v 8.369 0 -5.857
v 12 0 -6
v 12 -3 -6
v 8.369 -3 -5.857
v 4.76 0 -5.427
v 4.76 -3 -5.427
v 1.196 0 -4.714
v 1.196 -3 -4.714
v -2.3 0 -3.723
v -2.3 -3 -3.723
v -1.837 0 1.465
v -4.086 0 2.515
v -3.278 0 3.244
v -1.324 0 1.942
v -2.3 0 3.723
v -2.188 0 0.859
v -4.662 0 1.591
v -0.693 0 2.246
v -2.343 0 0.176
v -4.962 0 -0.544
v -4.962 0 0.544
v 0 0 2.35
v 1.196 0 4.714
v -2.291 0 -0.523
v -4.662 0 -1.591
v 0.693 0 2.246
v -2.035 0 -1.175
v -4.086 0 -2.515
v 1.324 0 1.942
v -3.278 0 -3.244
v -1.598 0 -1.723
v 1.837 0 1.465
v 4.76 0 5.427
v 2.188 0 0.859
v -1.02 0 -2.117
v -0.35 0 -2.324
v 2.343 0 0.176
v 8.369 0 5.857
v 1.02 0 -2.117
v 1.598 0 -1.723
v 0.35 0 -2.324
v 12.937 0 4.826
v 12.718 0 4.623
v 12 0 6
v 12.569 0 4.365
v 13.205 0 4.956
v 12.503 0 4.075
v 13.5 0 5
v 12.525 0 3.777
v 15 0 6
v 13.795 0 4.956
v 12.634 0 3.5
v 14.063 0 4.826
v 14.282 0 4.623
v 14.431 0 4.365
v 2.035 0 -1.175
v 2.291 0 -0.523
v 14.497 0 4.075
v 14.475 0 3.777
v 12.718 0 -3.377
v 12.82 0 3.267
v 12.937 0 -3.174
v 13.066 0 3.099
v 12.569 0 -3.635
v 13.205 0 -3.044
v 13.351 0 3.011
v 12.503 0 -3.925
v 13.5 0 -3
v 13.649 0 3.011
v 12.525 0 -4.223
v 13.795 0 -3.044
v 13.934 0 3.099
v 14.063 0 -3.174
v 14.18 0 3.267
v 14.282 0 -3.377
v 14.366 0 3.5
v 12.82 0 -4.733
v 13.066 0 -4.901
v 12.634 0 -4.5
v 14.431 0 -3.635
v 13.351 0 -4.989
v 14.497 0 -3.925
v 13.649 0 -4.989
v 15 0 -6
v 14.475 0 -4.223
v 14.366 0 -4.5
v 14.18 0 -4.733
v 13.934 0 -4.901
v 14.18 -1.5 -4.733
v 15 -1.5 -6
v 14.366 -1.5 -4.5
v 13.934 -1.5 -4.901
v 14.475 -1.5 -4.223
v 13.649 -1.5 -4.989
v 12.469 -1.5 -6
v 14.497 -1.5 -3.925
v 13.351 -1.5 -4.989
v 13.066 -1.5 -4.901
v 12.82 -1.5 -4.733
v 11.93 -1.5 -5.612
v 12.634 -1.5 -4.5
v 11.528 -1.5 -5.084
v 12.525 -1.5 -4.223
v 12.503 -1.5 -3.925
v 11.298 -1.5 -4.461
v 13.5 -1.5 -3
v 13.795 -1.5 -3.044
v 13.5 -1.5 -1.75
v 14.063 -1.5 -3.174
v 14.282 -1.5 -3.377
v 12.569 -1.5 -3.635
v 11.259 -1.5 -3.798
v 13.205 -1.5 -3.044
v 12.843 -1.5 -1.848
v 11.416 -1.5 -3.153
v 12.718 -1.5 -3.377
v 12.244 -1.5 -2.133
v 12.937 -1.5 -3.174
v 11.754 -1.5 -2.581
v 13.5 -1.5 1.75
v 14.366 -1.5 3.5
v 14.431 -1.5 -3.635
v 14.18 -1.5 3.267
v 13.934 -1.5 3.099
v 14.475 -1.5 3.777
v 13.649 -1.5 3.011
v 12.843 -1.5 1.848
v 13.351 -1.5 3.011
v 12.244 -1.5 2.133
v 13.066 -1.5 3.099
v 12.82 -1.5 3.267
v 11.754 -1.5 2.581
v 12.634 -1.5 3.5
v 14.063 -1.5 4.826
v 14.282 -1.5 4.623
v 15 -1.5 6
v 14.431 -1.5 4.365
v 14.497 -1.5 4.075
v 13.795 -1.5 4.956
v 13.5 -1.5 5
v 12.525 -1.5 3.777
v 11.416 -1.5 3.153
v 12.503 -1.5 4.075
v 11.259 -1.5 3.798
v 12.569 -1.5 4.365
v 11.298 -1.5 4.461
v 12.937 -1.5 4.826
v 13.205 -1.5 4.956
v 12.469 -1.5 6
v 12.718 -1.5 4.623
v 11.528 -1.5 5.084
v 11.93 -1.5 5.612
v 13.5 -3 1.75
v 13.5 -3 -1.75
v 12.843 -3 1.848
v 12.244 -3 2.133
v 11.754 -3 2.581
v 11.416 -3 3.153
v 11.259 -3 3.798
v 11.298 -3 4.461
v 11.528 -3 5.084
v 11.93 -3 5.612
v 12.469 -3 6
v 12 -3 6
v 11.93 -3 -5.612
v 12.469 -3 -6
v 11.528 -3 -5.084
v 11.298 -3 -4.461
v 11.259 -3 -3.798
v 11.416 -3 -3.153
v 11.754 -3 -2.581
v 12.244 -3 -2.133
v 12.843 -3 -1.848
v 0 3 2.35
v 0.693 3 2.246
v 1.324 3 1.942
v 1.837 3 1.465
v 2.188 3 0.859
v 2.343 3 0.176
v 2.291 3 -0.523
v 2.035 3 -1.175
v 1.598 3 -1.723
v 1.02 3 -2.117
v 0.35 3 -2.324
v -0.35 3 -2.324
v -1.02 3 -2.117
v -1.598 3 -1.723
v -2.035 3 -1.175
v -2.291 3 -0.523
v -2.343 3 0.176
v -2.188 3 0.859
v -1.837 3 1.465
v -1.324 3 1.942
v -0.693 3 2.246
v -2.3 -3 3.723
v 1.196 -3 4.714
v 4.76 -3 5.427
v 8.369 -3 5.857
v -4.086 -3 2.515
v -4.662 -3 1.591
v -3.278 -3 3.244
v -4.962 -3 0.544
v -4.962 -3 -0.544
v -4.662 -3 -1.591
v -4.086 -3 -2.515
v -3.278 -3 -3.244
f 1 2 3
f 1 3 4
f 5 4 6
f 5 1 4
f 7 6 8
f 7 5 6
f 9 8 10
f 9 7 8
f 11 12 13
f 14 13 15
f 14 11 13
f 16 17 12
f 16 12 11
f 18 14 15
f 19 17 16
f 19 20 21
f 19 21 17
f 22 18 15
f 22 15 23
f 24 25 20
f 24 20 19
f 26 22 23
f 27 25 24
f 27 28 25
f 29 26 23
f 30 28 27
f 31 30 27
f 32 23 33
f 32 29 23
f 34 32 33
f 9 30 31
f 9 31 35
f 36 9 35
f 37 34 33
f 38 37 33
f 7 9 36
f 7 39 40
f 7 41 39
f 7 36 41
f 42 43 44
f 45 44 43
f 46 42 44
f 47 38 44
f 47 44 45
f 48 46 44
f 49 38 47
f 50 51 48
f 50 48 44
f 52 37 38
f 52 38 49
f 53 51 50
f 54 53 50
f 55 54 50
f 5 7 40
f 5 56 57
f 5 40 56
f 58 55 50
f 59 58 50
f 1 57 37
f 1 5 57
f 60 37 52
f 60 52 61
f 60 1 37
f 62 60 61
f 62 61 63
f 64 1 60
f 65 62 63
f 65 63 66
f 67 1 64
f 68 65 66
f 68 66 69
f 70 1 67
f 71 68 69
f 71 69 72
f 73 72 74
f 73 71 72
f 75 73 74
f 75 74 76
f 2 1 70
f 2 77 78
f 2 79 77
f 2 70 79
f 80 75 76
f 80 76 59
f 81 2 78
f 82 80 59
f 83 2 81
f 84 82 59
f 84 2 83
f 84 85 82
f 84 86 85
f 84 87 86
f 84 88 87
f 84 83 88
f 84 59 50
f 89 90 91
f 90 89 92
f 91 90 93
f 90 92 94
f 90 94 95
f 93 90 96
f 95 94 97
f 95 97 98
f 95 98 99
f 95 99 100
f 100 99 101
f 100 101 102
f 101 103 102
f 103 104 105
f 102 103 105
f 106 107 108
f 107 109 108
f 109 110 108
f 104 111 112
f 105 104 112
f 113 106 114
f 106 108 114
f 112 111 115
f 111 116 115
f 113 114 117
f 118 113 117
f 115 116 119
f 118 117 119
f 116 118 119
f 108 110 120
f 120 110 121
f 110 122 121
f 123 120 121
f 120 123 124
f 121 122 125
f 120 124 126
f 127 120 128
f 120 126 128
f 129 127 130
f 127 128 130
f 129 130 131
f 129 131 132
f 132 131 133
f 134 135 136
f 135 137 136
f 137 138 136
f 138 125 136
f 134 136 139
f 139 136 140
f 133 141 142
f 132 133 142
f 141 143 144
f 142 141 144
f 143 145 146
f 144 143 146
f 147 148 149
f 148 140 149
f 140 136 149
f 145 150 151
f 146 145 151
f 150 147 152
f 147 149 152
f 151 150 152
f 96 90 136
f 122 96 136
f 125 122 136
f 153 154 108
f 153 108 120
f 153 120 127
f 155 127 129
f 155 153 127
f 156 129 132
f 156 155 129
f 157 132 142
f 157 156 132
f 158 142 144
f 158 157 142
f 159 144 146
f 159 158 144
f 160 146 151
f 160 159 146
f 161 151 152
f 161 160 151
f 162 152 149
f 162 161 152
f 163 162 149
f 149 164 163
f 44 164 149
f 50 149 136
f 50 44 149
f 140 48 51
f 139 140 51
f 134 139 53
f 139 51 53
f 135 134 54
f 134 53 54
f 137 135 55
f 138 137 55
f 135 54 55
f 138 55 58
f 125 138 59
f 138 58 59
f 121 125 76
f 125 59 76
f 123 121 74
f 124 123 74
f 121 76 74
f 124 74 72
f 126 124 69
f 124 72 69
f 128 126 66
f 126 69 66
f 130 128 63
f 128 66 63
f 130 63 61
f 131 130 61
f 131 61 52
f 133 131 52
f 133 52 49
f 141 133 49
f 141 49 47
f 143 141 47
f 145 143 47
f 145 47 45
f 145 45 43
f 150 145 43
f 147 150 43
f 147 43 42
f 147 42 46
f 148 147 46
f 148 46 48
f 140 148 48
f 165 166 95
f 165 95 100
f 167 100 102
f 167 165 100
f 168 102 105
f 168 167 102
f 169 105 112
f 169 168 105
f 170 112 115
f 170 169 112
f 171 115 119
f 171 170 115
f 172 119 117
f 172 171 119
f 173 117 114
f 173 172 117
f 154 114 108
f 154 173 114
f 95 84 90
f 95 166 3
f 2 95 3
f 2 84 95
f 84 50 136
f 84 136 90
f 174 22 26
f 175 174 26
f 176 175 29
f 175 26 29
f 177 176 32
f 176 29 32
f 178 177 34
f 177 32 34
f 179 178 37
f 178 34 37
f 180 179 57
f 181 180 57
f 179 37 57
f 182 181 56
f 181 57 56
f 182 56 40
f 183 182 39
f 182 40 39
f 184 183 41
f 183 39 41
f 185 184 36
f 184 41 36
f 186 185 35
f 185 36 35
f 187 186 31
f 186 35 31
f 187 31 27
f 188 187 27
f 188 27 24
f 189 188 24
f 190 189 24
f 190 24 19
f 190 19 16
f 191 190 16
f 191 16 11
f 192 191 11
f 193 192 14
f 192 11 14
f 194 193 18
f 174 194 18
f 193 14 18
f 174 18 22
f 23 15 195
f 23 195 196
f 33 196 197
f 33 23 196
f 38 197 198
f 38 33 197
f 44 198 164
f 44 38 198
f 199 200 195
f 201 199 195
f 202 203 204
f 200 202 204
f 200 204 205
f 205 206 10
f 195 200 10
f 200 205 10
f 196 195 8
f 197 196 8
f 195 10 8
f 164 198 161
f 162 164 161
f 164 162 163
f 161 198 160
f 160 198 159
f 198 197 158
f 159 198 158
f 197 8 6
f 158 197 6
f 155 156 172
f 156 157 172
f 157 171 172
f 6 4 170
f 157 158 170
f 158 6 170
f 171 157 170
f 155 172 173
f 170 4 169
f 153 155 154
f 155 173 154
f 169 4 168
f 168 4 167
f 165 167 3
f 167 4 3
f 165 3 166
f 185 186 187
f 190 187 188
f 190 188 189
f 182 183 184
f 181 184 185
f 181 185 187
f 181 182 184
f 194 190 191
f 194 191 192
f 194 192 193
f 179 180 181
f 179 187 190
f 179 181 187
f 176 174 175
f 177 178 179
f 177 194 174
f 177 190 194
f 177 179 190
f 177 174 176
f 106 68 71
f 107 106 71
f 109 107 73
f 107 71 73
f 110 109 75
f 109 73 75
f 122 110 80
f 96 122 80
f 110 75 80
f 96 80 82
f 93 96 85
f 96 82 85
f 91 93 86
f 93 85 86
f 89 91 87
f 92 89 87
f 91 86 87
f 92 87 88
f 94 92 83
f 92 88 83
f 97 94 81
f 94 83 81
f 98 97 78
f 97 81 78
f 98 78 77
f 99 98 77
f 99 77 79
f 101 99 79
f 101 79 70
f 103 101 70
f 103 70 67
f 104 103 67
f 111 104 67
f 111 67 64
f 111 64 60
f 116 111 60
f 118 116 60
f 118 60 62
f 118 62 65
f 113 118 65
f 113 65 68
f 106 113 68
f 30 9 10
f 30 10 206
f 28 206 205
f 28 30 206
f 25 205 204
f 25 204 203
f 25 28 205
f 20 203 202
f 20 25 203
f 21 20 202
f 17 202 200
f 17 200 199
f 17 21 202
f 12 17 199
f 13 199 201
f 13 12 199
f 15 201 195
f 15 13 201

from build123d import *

# Parameters (mm, degrees)
BOSS_EXTRUDE1_DEPTH     = 3
ESQUISSE3_R             = 2.35
BOSS_EXTRU_2_DEPTH      = 3
ESQUISSE4_R             = 1
ENL_V_MAT_EXTRU_1_DEPTH = 10
ENL_V_MAT_EXTRU_2_DEPTH = 1.5


with BuildPart() as part:
    # Sketch1 → Boss-Extrude1 (new body)
    with BuildSketch(Plane(origin=(0, 0, 0), x_dir=(1, 0, 0), z_dir=(0, 1, 0))):
        with BuildLine():
            Line((15, 6), (12, 6))
            ThreePointArc((12, 6), (4.759909364, 5.427135296), (-2.3, 3.72279784))
            ThreePointArc((-2.3, 3.72279784), (-5, 0), (-2.3, -3.72279784))
            ThreePointArc((-2.3, -3.72279784), (4.759909364, -5.427135296), (12, -6))
            Line((12, -6), (15, -6))
            Line((15, -6), (15, 6))
        make_face()
    extrude(amount=-BOSS_EXTRUDE1_DEPTH)

    # Esquisse3 → Boss.-Extru.2 (add)
    with BuildSketch(Plane(origin=(0, 0, 0), x_dir=(1, 0, 0), z_dir=(0, 1, 0))):
        with Locations(Location((0, 0, 0), (0, 0, 270))):
            Circle(ESQUISSE3_R)
    extrude(amount=BOSS_EXTRU_2_DEPTH)

    # Esquisse4 → Enlèv. mat.-Extru.1 (cut)
    with BuildSketch(Plane(origin=(0, 0, 0), x_dir=(1, 0, 0), z_dir=(0, 1, 0))):
        with Locations(Location((13.5, -4, 0), (0, 0, 270))):
            Circle(ESQUISSE4_R)
        with Locations(Location((13.5, 4, 0), (0, 0, 270))):
            Circle(ESQUISSE4_R)
    extrude(amount=-ENL_V_MAT_EXTRU_1_DEPTH, mode=Mode.SUBTRACT)

    # Esquisse5 → Enlèv. mat.-Extru.2 (cut)
    with BuildSketch(Plane.XZ.offset(3)):
        with BuildLine():
            Line((13.5, 6.25), (13.5, 10.037760659))
            Line((13.5, 10.037760659), (19.160989733, 10.037760659))
            Line((19.160989733, 10.037760659), (18.711161689, -10.096981605))
            Line((18.711161689, -10.096981605), (13.5, -10.096981605))
            Line((13.5, -10.096981605), (13.5, -6.25))
            ThreePointArc((13.5, -6.25), (11.25, -4), (13.5, -1.75))
            Line((13.5, -1.75), (13.5, 1.75))
            ThreePointArc((13.5, 1.75), (11.25, 4), (13.5, 6.25))
        make_face()
    extrude(amount=-ENL_V_MAT_EXTRU_2_DEPTH, mode=Mode.SUBTRACT)


solid = part.part
